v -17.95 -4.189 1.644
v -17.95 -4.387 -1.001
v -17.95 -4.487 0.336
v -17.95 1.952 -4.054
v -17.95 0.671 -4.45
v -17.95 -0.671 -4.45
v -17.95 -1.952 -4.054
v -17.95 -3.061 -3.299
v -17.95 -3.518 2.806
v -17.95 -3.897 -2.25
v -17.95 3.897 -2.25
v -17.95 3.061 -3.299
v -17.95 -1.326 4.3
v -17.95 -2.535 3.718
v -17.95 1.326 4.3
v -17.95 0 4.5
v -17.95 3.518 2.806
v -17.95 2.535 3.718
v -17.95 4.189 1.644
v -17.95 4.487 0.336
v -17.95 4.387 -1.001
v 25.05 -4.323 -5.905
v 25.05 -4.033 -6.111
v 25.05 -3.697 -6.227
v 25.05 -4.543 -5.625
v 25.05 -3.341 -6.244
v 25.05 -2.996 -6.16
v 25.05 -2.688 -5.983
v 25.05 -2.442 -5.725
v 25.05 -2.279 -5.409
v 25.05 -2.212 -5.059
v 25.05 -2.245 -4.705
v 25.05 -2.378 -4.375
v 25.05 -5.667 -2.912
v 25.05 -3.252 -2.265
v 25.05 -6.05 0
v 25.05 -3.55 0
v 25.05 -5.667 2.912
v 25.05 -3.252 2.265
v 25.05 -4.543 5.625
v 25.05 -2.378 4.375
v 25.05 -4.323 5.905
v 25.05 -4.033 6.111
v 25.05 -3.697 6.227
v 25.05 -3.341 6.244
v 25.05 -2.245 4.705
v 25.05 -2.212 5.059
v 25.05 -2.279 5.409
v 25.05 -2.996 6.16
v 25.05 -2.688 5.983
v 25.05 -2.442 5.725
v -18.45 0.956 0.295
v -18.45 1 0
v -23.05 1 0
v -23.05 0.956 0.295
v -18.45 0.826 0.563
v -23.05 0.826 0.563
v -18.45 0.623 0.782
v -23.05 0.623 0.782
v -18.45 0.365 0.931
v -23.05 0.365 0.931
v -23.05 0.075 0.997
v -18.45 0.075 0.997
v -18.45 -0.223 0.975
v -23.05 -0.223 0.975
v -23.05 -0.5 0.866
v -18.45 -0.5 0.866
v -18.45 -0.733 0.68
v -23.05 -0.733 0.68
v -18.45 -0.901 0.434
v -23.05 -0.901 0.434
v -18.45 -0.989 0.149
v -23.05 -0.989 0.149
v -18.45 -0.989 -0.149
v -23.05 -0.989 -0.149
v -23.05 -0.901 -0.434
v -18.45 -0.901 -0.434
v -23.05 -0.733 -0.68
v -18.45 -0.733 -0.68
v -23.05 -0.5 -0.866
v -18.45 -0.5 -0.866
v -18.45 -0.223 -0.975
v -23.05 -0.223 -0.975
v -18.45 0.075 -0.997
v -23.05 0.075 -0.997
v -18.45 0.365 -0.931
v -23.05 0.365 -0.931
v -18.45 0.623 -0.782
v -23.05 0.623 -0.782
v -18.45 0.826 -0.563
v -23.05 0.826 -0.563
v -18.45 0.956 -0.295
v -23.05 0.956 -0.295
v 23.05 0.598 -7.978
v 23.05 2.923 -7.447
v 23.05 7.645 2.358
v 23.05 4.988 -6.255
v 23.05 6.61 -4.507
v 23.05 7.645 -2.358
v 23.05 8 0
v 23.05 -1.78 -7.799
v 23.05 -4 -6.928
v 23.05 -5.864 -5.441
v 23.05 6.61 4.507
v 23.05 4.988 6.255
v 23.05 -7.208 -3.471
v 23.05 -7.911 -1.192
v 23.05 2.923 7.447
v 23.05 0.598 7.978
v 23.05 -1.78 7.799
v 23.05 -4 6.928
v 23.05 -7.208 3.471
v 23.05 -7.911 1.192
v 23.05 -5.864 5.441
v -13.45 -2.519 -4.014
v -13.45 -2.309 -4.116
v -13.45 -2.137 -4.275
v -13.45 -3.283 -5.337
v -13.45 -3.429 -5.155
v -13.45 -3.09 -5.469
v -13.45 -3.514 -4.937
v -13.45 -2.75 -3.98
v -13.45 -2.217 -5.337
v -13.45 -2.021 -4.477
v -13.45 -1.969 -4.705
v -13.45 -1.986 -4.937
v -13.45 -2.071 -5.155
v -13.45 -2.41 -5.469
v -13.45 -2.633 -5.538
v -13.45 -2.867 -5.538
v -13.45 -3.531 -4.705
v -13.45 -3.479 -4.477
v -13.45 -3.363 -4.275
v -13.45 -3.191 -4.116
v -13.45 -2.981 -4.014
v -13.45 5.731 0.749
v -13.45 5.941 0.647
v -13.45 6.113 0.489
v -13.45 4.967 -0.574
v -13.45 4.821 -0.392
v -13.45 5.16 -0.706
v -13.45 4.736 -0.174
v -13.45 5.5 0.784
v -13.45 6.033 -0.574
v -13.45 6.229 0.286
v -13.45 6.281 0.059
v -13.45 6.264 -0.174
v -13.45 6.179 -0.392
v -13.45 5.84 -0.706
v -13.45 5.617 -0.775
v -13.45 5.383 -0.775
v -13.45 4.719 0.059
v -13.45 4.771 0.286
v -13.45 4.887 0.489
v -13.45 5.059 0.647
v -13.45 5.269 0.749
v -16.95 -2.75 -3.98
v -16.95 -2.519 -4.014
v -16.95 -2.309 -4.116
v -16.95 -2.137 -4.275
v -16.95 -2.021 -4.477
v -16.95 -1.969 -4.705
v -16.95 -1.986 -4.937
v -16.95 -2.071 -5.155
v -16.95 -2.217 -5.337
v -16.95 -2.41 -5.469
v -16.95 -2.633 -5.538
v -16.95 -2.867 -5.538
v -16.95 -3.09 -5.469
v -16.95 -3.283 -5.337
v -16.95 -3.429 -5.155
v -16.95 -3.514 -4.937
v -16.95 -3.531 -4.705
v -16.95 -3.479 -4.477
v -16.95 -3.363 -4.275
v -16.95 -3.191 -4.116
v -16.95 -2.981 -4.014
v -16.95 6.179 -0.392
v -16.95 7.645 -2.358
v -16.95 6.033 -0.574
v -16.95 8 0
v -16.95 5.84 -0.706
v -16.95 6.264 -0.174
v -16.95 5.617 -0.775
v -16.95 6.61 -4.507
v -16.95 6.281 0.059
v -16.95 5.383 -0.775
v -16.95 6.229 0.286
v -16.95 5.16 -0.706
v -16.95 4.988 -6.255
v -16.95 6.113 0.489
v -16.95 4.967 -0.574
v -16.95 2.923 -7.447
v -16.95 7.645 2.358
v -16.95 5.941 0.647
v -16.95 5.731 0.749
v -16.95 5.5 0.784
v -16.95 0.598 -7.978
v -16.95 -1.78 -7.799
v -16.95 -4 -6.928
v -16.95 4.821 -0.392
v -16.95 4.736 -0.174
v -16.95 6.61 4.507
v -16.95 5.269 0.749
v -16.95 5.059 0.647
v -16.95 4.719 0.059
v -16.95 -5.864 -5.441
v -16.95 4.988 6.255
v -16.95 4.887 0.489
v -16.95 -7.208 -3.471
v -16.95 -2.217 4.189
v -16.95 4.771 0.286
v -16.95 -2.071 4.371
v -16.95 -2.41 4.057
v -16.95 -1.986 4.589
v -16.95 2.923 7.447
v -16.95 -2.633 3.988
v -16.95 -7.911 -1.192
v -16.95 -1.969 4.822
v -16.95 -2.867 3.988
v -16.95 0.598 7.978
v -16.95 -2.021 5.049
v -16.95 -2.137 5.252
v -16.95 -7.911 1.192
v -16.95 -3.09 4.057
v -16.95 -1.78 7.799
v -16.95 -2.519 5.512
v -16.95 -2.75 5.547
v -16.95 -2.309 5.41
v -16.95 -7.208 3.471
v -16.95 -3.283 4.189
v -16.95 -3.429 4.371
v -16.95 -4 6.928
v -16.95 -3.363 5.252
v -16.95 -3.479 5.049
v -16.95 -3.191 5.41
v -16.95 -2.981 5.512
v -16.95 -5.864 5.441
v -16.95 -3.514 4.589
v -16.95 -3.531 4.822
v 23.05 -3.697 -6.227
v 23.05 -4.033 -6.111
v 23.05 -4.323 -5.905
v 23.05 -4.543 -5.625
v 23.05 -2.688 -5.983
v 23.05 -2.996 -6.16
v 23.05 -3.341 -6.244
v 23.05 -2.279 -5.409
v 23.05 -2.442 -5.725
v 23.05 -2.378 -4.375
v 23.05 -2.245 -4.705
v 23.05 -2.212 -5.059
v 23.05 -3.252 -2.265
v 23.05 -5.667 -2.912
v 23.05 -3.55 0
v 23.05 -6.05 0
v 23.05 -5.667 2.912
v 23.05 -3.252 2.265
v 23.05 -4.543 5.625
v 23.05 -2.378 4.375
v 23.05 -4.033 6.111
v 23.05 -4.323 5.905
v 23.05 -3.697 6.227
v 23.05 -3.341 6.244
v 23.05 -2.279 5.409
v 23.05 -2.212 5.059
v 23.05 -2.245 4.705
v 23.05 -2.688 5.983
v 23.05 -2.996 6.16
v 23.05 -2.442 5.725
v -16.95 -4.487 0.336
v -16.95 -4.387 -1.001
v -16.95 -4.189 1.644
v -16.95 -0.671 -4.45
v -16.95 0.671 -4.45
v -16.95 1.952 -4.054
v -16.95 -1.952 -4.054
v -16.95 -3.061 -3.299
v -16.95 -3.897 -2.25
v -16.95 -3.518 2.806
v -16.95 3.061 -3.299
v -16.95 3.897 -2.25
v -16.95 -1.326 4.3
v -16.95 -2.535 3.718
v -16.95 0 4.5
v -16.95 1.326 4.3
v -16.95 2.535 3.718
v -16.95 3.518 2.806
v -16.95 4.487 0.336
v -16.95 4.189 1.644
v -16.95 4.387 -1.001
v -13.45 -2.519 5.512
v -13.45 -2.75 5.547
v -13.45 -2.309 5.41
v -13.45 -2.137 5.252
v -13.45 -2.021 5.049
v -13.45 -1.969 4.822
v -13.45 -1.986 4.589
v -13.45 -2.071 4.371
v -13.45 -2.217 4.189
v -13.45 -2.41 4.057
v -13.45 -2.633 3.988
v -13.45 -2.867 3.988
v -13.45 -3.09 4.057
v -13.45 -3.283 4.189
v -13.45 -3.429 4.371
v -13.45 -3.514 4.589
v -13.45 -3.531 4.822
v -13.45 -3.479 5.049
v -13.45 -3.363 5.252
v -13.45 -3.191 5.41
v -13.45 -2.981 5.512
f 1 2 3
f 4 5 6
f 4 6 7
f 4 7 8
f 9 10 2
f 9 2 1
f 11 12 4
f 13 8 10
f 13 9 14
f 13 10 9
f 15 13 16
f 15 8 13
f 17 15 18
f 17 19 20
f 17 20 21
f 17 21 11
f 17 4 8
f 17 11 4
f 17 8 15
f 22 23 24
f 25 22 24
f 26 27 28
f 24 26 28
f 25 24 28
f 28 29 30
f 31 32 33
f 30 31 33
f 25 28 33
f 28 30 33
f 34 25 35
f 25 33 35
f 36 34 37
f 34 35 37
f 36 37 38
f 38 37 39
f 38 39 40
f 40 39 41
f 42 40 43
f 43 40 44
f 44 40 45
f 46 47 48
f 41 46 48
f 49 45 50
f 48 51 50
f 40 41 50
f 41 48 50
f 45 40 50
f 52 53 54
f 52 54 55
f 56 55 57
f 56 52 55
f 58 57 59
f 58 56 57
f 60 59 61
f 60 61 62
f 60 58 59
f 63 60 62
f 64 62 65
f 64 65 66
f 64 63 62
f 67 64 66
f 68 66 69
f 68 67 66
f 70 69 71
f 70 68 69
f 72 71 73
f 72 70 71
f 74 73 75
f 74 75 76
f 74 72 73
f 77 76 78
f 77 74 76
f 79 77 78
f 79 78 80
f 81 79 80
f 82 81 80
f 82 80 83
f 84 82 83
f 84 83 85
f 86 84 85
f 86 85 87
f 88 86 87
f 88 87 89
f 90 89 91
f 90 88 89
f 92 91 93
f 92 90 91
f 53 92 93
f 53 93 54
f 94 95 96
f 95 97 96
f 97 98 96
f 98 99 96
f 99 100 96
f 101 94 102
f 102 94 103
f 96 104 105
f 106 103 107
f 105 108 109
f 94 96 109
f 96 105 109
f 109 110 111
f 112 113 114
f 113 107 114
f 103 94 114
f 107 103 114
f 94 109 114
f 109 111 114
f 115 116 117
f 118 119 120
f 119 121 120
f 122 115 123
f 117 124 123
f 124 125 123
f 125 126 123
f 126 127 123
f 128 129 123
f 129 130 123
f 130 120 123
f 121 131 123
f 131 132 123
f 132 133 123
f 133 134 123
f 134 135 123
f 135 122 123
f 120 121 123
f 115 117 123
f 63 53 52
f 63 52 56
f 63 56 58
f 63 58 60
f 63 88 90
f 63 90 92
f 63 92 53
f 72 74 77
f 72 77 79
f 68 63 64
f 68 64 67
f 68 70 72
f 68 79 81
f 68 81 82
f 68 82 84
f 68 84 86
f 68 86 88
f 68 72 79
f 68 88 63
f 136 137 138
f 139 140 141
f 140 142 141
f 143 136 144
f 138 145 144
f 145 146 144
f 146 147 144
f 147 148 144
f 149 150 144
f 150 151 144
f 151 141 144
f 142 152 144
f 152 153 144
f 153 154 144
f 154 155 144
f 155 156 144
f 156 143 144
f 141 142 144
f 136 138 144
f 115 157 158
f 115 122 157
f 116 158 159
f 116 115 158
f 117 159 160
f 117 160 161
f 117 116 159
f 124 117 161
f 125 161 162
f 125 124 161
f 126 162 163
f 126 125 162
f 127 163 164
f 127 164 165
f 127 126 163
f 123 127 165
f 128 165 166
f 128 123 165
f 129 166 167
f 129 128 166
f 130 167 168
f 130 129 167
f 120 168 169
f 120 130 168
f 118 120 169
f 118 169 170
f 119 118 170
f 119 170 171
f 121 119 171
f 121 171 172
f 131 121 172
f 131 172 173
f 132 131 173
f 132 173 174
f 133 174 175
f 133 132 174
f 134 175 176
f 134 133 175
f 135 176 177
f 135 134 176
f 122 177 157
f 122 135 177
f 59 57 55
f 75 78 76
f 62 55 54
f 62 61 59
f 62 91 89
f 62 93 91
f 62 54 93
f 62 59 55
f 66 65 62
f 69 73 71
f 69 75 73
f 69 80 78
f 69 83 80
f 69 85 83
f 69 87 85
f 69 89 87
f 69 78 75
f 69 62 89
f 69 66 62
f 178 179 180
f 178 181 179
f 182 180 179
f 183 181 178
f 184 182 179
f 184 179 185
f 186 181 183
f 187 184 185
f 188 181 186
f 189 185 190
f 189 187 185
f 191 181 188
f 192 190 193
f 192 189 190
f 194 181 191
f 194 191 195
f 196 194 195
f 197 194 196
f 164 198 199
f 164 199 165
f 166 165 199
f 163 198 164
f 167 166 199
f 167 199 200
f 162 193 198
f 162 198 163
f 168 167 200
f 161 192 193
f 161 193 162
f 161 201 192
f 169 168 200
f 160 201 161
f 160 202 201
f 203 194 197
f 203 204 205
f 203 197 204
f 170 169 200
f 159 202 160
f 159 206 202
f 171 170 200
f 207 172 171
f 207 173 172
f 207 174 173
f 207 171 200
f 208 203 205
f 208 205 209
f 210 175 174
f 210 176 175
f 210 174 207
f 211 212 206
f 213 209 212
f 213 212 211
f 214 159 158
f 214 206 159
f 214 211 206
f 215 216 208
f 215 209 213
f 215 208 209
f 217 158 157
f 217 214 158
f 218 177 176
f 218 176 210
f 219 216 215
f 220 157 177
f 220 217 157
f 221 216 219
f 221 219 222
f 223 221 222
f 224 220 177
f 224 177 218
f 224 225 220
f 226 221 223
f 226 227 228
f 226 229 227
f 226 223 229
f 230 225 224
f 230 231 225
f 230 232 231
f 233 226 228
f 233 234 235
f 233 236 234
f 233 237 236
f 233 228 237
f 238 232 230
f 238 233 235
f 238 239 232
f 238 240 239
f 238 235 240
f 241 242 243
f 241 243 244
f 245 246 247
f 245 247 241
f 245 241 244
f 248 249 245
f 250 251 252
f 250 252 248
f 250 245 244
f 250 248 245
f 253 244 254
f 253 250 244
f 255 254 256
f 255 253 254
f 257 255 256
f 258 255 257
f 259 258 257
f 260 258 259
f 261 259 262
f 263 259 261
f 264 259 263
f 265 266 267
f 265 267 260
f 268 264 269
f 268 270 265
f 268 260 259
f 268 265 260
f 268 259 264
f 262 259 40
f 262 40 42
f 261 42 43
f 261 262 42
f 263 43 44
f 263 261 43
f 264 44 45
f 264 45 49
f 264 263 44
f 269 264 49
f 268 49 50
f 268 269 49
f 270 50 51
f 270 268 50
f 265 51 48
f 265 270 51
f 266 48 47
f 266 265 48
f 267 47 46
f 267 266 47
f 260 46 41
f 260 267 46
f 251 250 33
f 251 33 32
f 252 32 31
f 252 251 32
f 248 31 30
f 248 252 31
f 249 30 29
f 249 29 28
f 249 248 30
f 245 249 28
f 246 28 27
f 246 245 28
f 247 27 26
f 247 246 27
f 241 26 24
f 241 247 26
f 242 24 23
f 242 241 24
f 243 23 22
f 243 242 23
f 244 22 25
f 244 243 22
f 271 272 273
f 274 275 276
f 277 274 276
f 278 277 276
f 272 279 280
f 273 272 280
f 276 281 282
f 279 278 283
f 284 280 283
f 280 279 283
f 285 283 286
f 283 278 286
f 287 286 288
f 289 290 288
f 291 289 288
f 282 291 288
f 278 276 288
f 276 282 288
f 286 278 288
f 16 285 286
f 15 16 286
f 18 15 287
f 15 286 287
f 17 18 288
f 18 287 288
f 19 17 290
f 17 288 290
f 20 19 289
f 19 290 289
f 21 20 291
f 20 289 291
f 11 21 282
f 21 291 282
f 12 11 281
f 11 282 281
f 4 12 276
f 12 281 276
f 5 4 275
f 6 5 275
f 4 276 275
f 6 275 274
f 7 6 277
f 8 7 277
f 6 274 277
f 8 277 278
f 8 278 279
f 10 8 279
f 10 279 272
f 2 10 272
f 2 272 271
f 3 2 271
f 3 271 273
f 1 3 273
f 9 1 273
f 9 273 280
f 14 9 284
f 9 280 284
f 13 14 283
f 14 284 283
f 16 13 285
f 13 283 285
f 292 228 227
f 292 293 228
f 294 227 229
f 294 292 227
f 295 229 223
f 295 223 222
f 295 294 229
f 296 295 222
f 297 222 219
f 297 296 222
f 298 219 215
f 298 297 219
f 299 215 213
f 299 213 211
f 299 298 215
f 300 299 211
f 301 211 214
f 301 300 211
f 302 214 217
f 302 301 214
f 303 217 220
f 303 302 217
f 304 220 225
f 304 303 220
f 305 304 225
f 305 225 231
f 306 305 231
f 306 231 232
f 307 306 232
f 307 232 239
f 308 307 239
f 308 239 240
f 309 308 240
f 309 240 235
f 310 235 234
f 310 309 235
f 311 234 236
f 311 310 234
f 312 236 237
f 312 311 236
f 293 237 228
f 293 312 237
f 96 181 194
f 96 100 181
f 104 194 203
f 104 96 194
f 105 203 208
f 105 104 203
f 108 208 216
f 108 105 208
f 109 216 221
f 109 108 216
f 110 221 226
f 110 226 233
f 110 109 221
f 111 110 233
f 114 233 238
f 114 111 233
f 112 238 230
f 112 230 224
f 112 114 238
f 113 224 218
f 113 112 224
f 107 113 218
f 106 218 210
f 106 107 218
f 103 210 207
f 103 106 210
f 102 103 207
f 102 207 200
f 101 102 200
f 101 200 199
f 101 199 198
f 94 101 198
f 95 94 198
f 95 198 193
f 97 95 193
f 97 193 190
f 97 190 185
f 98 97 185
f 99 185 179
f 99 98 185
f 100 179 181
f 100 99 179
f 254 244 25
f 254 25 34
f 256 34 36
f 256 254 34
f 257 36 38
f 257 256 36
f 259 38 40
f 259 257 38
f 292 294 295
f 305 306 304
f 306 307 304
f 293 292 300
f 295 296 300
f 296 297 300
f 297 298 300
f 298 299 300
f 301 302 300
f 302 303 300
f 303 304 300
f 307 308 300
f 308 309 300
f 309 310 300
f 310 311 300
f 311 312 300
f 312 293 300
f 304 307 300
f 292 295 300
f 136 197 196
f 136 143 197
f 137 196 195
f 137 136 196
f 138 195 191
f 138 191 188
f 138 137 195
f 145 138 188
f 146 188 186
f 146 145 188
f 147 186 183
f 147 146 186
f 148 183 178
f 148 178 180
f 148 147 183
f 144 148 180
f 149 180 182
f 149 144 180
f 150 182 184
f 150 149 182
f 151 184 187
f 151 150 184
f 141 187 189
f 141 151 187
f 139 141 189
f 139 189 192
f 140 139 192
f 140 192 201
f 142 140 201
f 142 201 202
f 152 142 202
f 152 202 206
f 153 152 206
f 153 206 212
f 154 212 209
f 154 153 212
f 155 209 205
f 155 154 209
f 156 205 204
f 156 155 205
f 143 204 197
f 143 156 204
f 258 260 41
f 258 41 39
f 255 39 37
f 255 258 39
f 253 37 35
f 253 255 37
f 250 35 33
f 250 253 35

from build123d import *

# Parameters (mm, degrees)
SKETCH9_W           = 5.1
SKETCH9_H           = 1
SKETCH11_W          = 40
SKETCH11_H          = 8
BOSS_EXTRUDE3_DEPTH = 2
SKETCH20_R          = 4.5
BOSS_EXTRUDE4_DEPTH = 1
SKETCH21_W          = 3.5
SKETCH21_H          = 0.5
SKETCH23_W          = 0.7835
SKETCH23_H          = 3.5
HOLE2_AT_2_COUNT    = 2
HOLE2_AT_2_PITCH    = 9.526279442
HOLE2_AT_3_COUNT    = 2
HOLE2_AT_3_PITCH    = 9.526279442


with BuildPart() as part:
    # Sketch9 → Revolve2 (revolve)
    with BuildSketch(Plane.XY):
        with Locations((-20.5, 0.5)):
            Rectangle(SKETCH9_W, SKETCH9_H)
    revolve(axis=Axis((-23.05, 0, 0), (1, 0, 0)))

    # Sketch21 → Ø7.0 (7) Diameter Hole2 (revolve, cut)
    with BuildSketch(Plane(origin=(-17.95, 0, 0), x_dir=(0, 0, -1), z_dir=(0, 1, 0))):
        with Locations((1.75, 0.25)):
            Rectangle(SKETCH21_W, SKETCH21_H)
    revolve(axis=Axis((-11.6, 0, 0), (-1, 0, 0)), mode=Mode.SUBTRACT)


with BuildPart() as body_2:
    # Sketch11 → Revolve3 (revolve)
    with BuildSketch(Plane.XY):
        with Locations((3.05, 4)):
            Rectangle(SKETCH11_W, SKETCH11_H)
    revolve(axis=Axis((-16.95, 0, 0), (1, 0, 0)))

    # Sketch23 → Hole2 (revolve, cut)
    with BuildSketch(Plane(origin=(-16.95, -2.75, -4.763139721), x_dir=(0, 0, 1), z_dir=(0, 1, 0))):
        with Locations((0.39175, 1.75)):
            Rectangle(SKETCH23_W, SKETCH23_H)
    hole2 = revolve(axis=Axis((93.05, -2.75, -4.763139721), (-1, 0, 0)), mode=Mode.SUBTRACT)

    # Hole2 at 2: Hole2 ×2
    with Locations(*[(0, 0, i * HOLE2_AT_2_PITCH) for i in range(1, HOLE2_AT_2_COUNT)]):
        add(hole2, mode=Mode.SUBTRACT)

    # Hole2 at 3: Hole2 ×2
    with Locations(*[Vector(0, 0.866025404, 0.5) * (i * HOLE2_AT_3_PITCH) for i in range(1, HOLE2_AT_3_COUNT)]):
        add(hole2, mode=Mode.SUBTRACT)


with BuildPart() as body_3:
    # Sketch15 → Boss-Extrude3 (new body)
    with BuildSketch(Plane(origin=(23.05, 0, 0), x_dir=(0, 0, -1), z_dir=(1, 0, 0))):
        with BuildLine():
            ThreePointArc((4.375, -2.377722283), (6.082531755, -2.835254038), (5.625, -4.542785793))
            ThreePointArc((5.625, -4.542785793), (0, -6.05), (-5.625, -4.542785793))
            ThreePointArc((-5.625, -4.542785793), (-6.082531755, -2.835254038), (-4.375, -2.377722283))
            ThreePointArc((-4.375, -2.377722283), (0, -3.55), (4.375, -2.377722283))
        make_face()
    extrude(amount=BOSS_EXTRUDE3_DEPTH)


with BuildPart() as body_4:
    # Sketch20 → Boss-Extrude4 (new body)
    with BuildSketch(Plane.ZY.offset(16.95)):
        Circle(SKETCH20_R)
    extrude(amount=BOSS_EXTRUDE4_DEPTH)


solid = Compound([part.part, body_2.part, body_3.part, body_4.part])
